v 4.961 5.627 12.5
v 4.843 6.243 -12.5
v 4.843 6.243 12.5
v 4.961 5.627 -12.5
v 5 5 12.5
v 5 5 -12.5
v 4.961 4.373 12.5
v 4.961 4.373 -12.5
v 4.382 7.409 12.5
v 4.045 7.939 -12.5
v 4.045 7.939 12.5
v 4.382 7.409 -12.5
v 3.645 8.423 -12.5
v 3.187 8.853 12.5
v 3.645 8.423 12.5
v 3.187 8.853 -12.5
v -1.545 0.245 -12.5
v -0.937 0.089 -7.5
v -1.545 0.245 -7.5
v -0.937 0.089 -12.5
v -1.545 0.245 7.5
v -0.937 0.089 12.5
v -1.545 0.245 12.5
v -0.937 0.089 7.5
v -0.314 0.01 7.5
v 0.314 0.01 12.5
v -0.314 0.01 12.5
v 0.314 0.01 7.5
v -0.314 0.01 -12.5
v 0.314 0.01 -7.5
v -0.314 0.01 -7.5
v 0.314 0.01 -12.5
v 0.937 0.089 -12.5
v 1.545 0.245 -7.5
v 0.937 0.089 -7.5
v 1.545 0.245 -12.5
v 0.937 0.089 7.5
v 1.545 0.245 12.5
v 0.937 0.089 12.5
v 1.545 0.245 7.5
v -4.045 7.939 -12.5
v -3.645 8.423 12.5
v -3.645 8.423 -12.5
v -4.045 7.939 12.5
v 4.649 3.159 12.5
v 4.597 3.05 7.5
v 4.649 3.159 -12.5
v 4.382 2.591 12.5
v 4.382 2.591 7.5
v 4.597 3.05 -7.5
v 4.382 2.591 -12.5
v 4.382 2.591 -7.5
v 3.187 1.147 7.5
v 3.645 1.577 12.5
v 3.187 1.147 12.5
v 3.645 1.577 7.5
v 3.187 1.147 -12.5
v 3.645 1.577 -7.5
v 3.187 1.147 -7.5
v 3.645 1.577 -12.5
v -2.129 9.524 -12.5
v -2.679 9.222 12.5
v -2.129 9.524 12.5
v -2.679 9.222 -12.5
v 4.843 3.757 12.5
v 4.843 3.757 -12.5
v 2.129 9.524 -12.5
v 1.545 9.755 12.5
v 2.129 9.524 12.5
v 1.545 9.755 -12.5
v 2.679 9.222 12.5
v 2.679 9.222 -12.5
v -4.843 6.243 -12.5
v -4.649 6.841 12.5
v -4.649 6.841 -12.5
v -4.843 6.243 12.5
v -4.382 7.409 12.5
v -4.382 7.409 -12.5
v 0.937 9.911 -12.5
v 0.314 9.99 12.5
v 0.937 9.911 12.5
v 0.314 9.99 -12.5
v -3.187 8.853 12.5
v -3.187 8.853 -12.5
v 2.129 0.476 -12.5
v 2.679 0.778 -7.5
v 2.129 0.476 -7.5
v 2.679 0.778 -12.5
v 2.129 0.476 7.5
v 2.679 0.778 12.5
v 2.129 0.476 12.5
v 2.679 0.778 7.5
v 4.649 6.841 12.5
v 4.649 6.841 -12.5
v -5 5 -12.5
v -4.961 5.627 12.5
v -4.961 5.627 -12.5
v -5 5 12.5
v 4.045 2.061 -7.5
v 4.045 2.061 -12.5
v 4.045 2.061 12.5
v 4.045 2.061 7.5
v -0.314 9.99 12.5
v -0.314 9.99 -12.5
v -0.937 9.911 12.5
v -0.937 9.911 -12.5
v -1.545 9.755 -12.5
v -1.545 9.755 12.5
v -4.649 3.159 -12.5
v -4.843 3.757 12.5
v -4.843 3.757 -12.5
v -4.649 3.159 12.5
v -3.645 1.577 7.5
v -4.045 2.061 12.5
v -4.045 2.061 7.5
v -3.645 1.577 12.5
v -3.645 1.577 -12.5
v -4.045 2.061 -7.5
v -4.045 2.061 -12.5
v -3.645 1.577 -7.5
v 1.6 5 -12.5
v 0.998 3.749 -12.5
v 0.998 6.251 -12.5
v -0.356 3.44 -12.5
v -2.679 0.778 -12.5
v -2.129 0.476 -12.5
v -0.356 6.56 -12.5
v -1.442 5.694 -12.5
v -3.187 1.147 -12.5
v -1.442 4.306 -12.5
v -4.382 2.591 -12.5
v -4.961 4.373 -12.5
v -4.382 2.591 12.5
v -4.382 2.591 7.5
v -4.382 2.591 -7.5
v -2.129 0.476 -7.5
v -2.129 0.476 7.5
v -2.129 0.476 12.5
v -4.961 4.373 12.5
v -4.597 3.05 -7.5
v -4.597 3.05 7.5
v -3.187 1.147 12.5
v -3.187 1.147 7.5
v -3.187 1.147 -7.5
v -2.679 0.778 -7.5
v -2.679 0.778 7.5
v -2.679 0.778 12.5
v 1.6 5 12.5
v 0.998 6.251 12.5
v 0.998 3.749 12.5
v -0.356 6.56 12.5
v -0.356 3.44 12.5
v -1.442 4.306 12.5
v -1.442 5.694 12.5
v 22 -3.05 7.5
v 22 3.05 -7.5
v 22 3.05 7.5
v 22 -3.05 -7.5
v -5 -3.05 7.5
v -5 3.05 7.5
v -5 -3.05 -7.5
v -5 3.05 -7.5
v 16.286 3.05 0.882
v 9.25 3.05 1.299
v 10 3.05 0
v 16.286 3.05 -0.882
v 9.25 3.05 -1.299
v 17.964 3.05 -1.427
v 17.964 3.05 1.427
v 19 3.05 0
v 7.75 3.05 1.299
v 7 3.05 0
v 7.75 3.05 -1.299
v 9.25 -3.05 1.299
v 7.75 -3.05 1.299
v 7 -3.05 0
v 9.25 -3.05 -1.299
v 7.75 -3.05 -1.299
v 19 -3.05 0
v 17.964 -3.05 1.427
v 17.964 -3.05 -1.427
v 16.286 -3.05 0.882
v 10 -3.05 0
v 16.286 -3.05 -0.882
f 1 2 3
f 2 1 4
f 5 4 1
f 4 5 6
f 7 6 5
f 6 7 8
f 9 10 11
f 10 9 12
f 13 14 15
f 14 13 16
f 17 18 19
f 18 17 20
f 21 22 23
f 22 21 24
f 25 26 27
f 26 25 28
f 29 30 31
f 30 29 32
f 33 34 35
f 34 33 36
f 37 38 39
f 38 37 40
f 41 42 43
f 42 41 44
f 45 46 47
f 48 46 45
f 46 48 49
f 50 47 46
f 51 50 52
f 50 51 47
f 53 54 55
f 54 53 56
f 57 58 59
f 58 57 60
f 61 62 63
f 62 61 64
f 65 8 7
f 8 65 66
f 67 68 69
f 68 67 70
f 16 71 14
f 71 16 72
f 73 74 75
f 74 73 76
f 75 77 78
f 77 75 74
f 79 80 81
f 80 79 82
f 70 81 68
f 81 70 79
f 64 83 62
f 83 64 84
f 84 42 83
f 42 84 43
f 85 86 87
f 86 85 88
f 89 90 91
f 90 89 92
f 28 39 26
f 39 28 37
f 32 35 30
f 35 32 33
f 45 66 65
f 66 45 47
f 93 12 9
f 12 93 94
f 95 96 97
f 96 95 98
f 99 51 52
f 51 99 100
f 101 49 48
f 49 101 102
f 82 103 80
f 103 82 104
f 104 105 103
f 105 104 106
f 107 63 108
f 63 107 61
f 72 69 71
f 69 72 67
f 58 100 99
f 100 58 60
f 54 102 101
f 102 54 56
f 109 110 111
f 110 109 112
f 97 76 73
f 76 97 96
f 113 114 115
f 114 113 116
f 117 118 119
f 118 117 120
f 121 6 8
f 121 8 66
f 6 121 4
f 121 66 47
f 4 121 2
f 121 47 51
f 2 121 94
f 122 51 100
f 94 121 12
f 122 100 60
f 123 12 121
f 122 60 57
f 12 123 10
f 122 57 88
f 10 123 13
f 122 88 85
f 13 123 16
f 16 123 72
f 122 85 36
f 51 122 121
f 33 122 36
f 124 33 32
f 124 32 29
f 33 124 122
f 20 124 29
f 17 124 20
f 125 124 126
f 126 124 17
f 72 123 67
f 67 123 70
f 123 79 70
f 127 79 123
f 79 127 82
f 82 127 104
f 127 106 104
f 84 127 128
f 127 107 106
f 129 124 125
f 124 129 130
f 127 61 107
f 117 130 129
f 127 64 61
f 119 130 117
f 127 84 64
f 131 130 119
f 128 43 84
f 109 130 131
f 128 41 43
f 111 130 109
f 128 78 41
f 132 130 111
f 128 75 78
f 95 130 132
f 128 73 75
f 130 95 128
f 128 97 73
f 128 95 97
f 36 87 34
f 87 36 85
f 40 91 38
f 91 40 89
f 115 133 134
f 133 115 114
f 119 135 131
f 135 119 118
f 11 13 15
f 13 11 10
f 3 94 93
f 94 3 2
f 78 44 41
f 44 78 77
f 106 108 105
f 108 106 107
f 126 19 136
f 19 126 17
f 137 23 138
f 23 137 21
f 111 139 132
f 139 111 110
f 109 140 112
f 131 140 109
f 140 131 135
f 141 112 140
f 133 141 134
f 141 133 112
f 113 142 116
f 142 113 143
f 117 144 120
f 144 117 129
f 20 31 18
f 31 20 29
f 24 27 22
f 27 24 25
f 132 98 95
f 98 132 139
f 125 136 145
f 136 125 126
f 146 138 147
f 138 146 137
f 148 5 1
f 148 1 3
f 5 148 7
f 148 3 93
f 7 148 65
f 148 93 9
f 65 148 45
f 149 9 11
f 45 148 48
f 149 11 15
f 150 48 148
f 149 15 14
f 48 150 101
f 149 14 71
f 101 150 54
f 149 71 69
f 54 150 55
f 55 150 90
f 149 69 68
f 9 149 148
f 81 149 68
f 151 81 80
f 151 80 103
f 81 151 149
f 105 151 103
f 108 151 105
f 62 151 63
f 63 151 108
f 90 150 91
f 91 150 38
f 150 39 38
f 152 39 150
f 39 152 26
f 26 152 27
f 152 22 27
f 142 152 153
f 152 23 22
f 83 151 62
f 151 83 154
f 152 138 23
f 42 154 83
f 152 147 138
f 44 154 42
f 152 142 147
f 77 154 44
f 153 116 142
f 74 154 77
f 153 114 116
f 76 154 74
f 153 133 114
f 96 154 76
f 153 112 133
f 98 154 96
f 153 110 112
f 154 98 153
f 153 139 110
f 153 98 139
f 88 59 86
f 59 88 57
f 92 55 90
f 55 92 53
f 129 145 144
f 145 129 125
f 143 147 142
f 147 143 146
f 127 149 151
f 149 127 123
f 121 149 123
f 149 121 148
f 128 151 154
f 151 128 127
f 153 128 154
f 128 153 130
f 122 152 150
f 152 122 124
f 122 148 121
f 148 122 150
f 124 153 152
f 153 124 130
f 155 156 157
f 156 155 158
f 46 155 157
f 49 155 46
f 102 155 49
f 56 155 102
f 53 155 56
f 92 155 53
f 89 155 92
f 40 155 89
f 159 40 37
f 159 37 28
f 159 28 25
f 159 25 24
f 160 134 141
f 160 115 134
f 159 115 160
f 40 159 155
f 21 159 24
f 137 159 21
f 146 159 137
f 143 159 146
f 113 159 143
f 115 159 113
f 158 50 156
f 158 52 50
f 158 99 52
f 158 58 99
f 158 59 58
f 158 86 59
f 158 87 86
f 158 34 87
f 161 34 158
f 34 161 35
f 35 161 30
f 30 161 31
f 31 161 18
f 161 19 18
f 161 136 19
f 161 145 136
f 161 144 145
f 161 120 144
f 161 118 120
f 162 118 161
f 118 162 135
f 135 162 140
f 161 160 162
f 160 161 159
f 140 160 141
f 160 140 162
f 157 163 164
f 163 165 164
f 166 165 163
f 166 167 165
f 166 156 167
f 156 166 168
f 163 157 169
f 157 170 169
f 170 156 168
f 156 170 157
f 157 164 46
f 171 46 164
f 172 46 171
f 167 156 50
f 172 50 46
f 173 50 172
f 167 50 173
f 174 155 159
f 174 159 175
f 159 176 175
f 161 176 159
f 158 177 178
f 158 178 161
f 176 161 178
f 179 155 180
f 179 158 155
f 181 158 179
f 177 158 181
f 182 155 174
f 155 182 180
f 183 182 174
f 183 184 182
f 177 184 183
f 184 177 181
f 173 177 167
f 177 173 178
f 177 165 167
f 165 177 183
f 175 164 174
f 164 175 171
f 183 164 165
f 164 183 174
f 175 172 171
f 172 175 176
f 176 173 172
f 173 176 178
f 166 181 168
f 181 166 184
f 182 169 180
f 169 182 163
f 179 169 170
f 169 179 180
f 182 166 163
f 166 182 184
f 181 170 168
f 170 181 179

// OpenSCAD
// mount
m_w = 15;
m_l = 27;
m_th = 6.1;

// cylinder section
c_do = 10;
c_di = 3.2;
c_h = 25;

// m3 bolt cutout
bolt_m3_r = 3/2;


translate([0,c_do/2,0])
difference() {
cylinder(r=c_do / 2, h=c_h, center=true, $fn=50);
cylinder(r=c_di / 2, h=c_h+.1, center=true, $fn=7);
}

translate([(m_l-c_do)/2,0,0])
difference(){
cube([m_l, m_th, m_w], center=true);
rotate([90,0,0])cylinder(r=bolt_m3_r, h=m_th+1, center=true, $fn=6);
translate([m_l/3,0,0]) rotate([90,0,0])cylinder(r=bolt_m3_r, h=m_th+1, center=true, $fn=5);
}
